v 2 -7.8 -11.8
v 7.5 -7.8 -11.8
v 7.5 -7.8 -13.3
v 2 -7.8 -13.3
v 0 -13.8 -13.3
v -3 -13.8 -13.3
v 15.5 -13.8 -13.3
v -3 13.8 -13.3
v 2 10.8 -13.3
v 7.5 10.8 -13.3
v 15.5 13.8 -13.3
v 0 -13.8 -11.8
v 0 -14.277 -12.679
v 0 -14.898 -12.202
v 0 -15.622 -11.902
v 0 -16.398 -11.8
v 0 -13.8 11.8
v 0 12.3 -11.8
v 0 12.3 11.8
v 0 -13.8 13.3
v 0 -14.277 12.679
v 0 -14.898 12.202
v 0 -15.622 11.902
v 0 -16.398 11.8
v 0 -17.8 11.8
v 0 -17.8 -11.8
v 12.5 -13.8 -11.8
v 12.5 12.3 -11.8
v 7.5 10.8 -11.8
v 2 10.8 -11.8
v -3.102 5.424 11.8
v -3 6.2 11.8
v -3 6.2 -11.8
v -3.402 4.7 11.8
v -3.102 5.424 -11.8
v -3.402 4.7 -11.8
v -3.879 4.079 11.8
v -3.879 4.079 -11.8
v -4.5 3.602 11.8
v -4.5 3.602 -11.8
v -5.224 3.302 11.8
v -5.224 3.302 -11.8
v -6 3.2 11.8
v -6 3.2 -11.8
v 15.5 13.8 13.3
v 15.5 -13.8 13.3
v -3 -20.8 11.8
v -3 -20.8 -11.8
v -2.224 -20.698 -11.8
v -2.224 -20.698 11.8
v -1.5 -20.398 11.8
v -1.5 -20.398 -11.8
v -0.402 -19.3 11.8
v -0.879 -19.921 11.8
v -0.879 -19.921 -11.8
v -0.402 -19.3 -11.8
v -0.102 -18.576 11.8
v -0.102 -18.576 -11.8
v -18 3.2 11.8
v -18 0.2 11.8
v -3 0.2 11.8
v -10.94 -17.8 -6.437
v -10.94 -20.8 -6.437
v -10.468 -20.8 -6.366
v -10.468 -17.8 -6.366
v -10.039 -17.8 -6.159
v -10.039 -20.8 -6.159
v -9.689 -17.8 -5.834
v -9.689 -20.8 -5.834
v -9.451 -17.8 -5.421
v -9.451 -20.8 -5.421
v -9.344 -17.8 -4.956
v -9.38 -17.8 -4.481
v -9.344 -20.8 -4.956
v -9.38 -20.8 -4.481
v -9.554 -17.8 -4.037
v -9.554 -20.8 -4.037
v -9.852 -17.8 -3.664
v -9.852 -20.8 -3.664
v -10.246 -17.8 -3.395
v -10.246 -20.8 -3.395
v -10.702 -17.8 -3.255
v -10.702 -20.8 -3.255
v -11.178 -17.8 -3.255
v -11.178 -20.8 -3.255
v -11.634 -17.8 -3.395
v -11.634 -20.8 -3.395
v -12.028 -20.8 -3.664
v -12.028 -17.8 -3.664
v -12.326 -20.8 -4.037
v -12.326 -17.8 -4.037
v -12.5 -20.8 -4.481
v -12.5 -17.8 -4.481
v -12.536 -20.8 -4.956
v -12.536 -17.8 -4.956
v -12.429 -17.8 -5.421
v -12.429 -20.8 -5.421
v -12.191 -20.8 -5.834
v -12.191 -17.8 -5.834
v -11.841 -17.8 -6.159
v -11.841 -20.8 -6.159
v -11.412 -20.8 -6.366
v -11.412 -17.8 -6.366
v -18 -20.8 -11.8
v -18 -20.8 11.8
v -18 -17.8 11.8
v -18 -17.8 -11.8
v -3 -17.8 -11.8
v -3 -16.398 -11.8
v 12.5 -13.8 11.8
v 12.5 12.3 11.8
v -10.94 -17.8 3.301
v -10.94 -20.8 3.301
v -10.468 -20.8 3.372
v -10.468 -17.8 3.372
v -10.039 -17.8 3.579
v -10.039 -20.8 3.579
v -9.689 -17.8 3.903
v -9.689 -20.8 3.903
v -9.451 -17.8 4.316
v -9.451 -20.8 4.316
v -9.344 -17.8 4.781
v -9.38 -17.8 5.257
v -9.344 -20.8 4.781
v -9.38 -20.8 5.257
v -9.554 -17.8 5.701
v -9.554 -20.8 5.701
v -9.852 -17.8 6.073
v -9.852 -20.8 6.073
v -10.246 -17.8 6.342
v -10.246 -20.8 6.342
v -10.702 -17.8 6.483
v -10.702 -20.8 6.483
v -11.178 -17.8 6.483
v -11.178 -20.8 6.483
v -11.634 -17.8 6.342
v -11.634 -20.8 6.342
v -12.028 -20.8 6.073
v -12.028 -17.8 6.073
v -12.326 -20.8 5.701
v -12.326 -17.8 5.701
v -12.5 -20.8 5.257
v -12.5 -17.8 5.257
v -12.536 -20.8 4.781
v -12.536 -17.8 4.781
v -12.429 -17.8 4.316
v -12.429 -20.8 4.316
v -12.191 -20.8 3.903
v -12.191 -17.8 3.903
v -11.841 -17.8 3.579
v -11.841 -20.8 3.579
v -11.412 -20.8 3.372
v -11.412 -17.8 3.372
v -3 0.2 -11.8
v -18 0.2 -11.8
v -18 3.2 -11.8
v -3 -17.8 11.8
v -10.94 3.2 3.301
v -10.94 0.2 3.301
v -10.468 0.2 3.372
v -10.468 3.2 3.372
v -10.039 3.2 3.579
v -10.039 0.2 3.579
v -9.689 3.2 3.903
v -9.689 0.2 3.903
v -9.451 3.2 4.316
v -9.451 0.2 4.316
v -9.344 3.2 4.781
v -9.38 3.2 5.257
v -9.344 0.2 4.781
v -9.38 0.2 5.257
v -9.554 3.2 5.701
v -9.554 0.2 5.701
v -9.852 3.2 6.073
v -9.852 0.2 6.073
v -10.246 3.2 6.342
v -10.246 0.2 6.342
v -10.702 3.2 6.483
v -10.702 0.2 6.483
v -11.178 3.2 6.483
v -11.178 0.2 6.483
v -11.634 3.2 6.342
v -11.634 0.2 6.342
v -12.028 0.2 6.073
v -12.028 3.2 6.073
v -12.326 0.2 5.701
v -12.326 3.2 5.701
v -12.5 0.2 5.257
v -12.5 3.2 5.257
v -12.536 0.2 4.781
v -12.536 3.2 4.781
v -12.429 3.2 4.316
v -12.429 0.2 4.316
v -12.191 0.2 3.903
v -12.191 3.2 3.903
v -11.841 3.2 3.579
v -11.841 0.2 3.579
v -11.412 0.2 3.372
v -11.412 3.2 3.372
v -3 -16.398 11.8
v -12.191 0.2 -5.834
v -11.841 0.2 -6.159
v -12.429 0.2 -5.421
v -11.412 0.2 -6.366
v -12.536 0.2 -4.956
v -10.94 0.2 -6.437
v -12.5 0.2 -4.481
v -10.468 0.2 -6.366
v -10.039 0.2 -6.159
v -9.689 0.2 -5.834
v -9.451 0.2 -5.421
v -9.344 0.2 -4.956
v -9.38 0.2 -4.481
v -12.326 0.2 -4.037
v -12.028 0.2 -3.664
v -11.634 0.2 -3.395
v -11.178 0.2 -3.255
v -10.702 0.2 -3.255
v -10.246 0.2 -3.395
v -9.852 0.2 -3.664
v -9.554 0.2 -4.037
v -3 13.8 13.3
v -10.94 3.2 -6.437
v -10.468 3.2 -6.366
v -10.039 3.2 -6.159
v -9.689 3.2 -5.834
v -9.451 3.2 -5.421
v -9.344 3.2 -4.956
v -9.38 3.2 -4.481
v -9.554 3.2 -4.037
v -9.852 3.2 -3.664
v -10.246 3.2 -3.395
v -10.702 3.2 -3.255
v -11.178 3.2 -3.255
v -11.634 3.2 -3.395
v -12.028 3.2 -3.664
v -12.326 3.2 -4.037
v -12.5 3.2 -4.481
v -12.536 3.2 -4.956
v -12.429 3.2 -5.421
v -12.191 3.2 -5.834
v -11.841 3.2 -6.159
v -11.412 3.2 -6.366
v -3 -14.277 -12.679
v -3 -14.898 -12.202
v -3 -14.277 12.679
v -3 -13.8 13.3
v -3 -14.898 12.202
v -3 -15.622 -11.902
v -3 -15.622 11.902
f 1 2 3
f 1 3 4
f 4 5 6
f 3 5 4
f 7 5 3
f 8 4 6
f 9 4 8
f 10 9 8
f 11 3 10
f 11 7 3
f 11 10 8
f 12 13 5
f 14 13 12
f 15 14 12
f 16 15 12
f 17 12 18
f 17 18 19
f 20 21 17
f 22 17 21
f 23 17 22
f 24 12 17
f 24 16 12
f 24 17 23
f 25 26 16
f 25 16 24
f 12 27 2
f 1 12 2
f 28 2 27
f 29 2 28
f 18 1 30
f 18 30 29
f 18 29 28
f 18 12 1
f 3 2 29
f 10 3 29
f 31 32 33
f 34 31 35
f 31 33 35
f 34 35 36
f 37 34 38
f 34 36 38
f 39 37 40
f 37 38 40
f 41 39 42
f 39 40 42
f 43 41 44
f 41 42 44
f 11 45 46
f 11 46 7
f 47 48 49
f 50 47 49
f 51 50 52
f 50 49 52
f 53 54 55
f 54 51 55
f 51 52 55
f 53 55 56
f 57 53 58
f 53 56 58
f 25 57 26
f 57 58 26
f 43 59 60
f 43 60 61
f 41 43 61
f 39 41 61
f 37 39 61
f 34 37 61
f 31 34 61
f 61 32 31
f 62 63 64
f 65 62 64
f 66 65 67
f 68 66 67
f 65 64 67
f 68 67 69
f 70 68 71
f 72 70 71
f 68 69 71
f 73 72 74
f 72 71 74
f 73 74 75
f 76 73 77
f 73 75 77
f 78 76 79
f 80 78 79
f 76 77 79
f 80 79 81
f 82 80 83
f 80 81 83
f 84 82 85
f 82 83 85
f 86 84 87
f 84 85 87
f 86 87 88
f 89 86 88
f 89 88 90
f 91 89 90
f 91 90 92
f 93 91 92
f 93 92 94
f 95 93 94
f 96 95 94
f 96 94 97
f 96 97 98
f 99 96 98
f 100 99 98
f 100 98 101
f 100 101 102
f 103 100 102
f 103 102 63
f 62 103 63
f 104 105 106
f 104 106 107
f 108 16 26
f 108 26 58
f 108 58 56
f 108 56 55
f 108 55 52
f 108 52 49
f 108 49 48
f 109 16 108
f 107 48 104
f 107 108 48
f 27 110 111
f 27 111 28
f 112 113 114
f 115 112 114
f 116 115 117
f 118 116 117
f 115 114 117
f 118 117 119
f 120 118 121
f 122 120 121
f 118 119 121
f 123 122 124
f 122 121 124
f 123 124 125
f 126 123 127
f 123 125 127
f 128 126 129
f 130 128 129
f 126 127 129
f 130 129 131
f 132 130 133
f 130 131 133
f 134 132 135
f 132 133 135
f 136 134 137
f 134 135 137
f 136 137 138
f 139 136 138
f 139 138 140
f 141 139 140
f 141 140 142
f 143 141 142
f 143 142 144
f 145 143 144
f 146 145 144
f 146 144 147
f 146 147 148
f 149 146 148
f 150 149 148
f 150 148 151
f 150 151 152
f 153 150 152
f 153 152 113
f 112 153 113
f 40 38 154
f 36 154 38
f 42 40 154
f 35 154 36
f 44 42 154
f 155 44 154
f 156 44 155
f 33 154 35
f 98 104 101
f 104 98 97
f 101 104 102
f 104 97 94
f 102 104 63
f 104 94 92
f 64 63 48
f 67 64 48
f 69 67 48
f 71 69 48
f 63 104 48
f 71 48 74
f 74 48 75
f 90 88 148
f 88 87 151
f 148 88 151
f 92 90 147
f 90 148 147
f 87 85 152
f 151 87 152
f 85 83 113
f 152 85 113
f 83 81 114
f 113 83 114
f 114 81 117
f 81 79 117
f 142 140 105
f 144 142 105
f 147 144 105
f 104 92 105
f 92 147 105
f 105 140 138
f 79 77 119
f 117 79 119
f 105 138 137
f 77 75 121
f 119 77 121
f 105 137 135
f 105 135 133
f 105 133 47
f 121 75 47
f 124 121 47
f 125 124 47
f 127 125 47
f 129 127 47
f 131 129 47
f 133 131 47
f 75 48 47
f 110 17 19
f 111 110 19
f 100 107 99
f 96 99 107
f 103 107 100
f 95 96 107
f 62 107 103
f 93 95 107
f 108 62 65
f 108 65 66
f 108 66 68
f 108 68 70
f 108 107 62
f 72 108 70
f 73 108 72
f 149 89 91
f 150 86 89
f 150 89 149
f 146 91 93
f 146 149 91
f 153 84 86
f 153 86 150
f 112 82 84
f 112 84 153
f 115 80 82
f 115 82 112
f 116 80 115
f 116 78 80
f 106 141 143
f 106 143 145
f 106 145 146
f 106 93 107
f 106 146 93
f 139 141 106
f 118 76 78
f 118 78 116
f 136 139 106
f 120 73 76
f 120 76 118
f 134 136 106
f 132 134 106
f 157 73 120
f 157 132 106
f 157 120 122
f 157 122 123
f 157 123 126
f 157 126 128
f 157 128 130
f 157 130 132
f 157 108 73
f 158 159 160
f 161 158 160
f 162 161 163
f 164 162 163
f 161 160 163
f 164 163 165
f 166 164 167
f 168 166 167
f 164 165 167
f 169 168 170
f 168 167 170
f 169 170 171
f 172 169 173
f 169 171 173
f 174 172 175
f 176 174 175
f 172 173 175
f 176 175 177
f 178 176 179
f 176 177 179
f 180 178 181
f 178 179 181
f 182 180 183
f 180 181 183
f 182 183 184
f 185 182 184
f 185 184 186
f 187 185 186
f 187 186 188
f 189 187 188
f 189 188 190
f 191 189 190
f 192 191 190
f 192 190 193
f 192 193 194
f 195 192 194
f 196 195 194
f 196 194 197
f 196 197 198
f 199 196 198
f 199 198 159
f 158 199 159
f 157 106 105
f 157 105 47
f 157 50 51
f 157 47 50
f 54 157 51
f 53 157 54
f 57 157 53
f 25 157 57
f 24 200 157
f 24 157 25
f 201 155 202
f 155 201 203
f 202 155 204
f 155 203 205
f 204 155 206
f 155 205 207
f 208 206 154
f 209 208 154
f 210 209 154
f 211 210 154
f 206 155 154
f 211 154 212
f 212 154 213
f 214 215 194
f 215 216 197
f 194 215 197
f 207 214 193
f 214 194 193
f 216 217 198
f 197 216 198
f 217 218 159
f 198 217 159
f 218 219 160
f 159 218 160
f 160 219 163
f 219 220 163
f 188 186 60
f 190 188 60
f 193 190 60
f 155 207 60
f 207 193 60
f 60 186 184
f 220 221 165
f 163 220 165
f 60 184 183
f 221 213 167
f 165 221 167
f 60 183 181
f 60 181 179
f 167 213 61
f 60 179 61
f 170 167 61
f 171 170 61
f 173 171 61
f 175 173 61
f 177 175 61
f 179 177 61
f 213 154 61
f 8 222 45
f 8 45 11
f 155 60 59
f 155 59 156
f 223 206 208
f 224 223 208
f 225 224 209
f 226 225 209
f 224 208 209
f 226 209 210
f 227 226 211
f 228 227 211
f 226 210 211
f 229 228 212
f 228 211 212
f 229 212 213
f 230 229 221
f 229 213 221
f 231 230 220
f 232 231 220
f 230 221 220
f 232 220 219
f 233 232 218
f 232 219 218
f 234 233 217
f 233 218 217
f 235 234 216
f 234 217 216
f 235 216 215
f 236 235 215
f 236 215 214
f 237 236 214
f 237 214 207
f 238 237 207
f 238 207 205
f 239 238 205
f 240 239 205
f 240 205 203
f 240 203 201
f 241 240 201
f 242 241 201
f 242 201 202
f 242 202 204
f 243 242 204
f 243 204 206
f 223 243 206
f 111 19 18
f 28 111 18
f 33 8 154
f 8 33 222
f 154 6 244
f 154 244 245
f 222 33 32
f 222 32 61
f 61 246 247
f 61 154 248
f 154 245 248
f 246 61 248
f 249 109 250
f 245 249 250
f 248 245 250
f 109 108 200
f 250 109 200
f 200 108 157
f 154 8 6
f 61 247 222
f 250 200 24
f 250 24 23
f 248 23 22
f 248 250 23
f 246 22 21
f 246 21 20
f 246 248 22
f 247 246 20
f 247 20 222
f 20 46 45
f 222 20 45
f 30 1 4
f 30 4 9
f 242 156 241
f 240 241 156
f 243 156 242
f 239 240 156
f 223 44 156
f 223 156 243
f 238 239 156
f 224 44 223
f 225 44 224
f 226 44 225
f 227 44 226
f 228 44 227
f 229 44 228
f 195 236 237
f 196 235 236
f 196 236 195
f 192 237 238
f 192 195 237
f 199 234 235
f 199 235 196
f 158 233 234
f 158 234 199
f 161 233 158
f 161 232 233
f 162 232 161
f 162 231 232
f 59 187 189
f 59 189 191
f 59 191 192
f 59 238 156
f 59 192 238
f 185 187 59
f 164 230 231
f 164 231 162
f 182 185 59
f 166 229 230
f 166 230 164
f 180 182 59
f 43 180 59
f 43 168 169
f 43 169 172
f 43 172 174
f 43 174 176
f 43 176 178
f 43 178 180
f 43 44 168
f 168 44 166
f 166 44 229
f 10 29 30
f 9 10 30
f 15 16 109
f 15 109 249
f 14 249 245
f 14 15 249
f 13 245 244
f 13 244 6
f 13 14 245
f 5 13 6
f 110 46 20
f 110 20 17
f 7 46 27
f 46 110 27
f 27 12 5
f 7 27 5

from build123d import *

# Parameters (mm, degrees)
SKETCH1_W                = 26.6
SKETCH1_H                = 27.6
SKETCH1_W_2              = 23.6
SKETCH1_H_2              = 24.6
BOSS_EXTRUDE1_DEPTH      = 12.5
SKETCH2_W                = 26.6
SKETCH2_H                = 27.6
BOSS_EXTRUDE2_DEPTH      = 3
SKETCH4_W                = 26.6
SKETCH4_H                = 27.6
BOSS_EXTRUDE3_DEPTH      = 3
SKETCH6_W                = 12.5
SKETCH6_H                = 20.6
CUT_EXTRUDE1_DEPTH       = 3
BOSS_EXTRUDE4_DEPTH      = 7
BOSS_EXTRUDE4_DEPTH_BACK = 17
SKETCH7_W                = 12.54
SKETCH7_H                = 14.392021094
SKETCH8_R                = 1.6
CUT_EXTRUDE2_DEPTH       = 41.17835238
SKETCH10_W               = 9.54
SKETCH10_H               = 18
CUT_EXTRUDE3_DEPTH       = 34.198989028
SKETCH14_W               = 12.5
SKETCH14_H               = 23.6
CUT_EXTRUDE5_DEPTH       = 3
SKETCH24_W               = 3
SKETCH24_H               = 5.880857343
BOSS_EXTRUDE7_DEPTH      = 7
SKETCH25_W               = 3
SKETCH25_H               = 6.327121563
BOSS_EXTRUDE8_DEPTH      = 7
SKETCH27_W               = 26.6
SKETCH27_H               = 3
BOSS_EXTRUDE9_DEPTH      = 20
SKETCH32_W               = 26.6
SKETCH32_H               = 3
BOSS_EXTRUDE10_DEPTH     = 20
FILLET1_R                = 3
SKETCH35_W               = 20
SKETCH35_H               = 24
CUT_EXTRUDE9_DEPTH       = 1.5
SKETCH36_W               = 3
SKETCH36_H               = 7
CUT_EXTRUDE10_DEPTH      = 1.5
SKETCH37_W               = 20
SKETCH37_H               = 24
CUT_EXTRUDE11_DEPTH      = 1.5
SKETCH38_W               = 3
SKETCH38_H               = 7
CUT_EXTRUDE12_DEPTH      = 1.5
FILLET3_R                = 3
FILLET4_R                = 3
FILLET5_R                = 3
SKETCH39_W               = 5
SKETCH39_H               = 23.6
CUT_EXTRUDE13_DEPTH      = 24
SKETCH41_R               = 1.6
CUT_EXTRUDE14_DEPTH      = 24
SKETCH42_W               = 5.5
SKETCH42_H               = 18.6
CUT_EXTRUDE15_DEPTH      = 38.237749663


with BuildPart() as part:
    # Sketch1 → Boss-Extrude1 (new body)
    with BuildSketch(Plane(origin=(0, 0, 0), x_dir=(0, 0, -1), z_dir=(1, 0, 0))):
        Rectangle(SKETCH1_W, SKETCH1_H)
        Rectangle(SKETCH1_W_2, SKETCH1_H_2, mode=Mode.SUBTRACT)
    extrude(amount=BOSS_EXTRUDE1_DEPTH)

    # Sketch2 → Boss-Extrude2 (add)
    with BuildSketch(Plane.ZY):
        Rectangle(SKETCH2_W, SKETCH2_H)
    extrude(amount=BOSS_EXTRUDE2_DEPTH)

    # Sketch4 → Boss-Extrude3 (add)
    with BuildSketch(Plane(origin=(12.5, 0, 0), x_dir=(0, 0, -1), z_dir=(1, 0, 0))):
        Rectangle(SKETCH4_W, SKETCH4_H)
    extrude(amount=BOSS_EXTRUDE3_DEPTH)

    # Sketch6 → Cut-Extrude1 (cut)
    with BuildSketch(Plane(origin=(0, -13.8, 0), x_dir=(-1, 0, 0), z_dir=(0, -1, 0))):
        with Locations((-6.25, 0)):
            Rectangle(SKETCH6_W, SKETCH6_H)
    extrude(amount=-CUT_EXTRUDE1_DEPTH, mode=Mode.SUBTRACT)

    # Sketch7 → Boss-Extrude4 (add, two sides: drawn at the far end of the back side and taken through both)
    with BuildSketch(Plane(origin=(0, -13.8, 0), x_dir=(-1, 0, 0), z_dir=(0, -1, 0)).offset(-BOSS_EXTRUDE4_DEPTH_BACK)):
        with Locations((6.27, -0.22313211)):
            Rectangle(SKETCH7_W, SKETCH7_H)
    extrude(amount=BOSS_EXTRUDE4_DEPTH + BOSS_EXTRUDE4_DEPTH_BACK)

    # Sketch8 → Cut-Extrude2 (cut, through all)
    with BuildSketch(Plane(origin=(0, -20.8, 0), x_dir=(-1, 0, 0), z_dir=(0, -1, 0))):
        with Locations(Location((9.94, -4.900507757, 0), (0, 0, 90))):
            Circle(SKETCH8_R)
        with Locations(Location((9.94, 4.836704631, 0), (0, 0, 90))):
            Circle(SKETCH8_R)
    extrude(amount=-CUT_EXTRUDE2_DEPTH, mode=Mode.SUBTRACT)

    # Sketch10 → Cut-Extrude3 (cut, through all)
    with BuildSketch(Plane.XY.offset(7.419142657)):
        with Locations((-7.77, -8.8)):
            Rectangle(SKETCH10_W, SKETCH10_H)
    extrude(amount=-CUT_EXTRUDE3_DEPTH, mode=Mode.SUBTRACT)

    # Sketch14 → Cut-Extrude5 (cut)
    with BuildSketch(Plane(origin=(0, -13.8, 0), x_dir=(-1, 0, 0), z_dir=(0, -1, 0))):
        with Locations((-6.25, 0)):
            Rectangle(SKETCH14_W, SKETCH14_H)
    extrude(amount=-CUT_EXTRUDE5_DEPTH, mode=Mode.SUBTRACT)

    # Sketch24 → Boss-Extrude7 (add)
    with BuildSketch(Plane(origin=(0, -13.8, 0), x_dir=(-1, 0, 0), z_dir=(0, -1, 0))):
        with Locations((1.5, -10.359571328)):
            Rectangle(SKETCH24_W, SKETCH24_H)
    extrude(amount=BOSS_EXTRUDE7_DEPTH)

    # Sketch25 → Boss-Extrude8 (add)
    with BuildSketch(Plane(origin=(0, -13.8, 0), x_dir=(-1, 0, 0), z_dir=(0, -1, 0))):
        with Locations((1.5, 10.136439219)):
            Rectangle(SKETCH25_W, SKETCH25_H)
    extrude(amount=BOSS_EXTRUDE8_DEPTH)

    # Sketch27 → Boss-Extrude9 (add)
    with BuildSketch(Plane.ZY.offset(3)):
        with Locations((0, -19.3)):
            Rectangle(SKETCH27_W, SKETCH27_H)
    extrude(amount=BOSS_EXTRUDE9_DEPTH)

    # Sketch32 → Boss-Extrude10 (add)
    with BuildSketch(Plane.ZY.offset(3)):
        with Locations((0, 1.7)):
            Rectangle(SKETCH32_W, SKETCH32_H)
    extrude(amount=BOSS_EXTRUDE10_DEPTH)

    # Fillet1
    fillet1_edges = [part.edges().sort_by_distance(p)[0] for p in [
        (0, -20.8, 0),
    ]]
    fillet(fillet1_edges, radius=FILLET1_R)

    # Sketch35 → Cut-Extrude9 (cut)
    with BuildSketch(Plane.XY.offset(13.3)):
        with Locations((-13, -8.8)):
            Rectangle(SKETCH35_W, SKETCH35_H)
    extrude(amount=-CUT_EXTRUDE9_DEPTH, mode=Mode.SUBTRACT)

    # Sketch36 → Cut-Extrude10 (cut)
    with BuildSketch(Plane.XY.offset(13.3)):
        with Locations((-1.5, -17.3)):
            Rectangle(SKETCH36_W, SKETCH36_H)
    extrude(amount=-CUT_EXTRUDE10_DEPTH, mode=Mode.SUBTRACT)

    # Sketch37 → Cut-Extrude11 (cut)
    with BuildSketch(Plane(origin=(0, 0, -13.3), x_dir=(-1, 0, 0), z_dir=(0, 0, -1))):
        with Locations((13, -8.8)):
            Rectangle(SKETCH37_W, SKETCH37_H)
    extrude(amount=-CUT_EXTRUDE11_DEPTH, mode=Mode.SUBTRACT)

    # Sketch38 → Cut-Extrude12 (cut)
    with BuildSketch(Plane(origin=(0, 0, -13.3), x_dir=(-1, 0, 0), z_dir=(0, 0, -1))):
        with Locations((1.5, -17.3)):
            Rectangle(SKETCH38_W, SKETCH38_H)
    extrude(amount=-CUT_EXTRUDE12_DEPTH, mode=Mode.SUBTRACT)

    # Fillet3
    # the kernel refuses this fillet: 3 mm, written as the material it adds along each edge
    with BuildSketch(Plane(origin=(-3, -13.8, 11.8), x_dir=(0, 0, 1), z_dir=(1, 0, 0))) as fillet3_piece_1:
        with BuildLine():
            CenterArc((3, 2.598076211), FILLET3_R, 180, 60)
            Line((0, 2.598076211), (0, 0))
            Line((0, 0), (1.5, 0))
        make_face()
    extrude(amount=3)

    # Fillet4
    # the kernel refuses this fillet: 3 mm, written as the material it adds along each edge
    with BuildSketch(Plane(origin=(0, -13.8, -11.8), x_dir=(0, 0, -1), z_dir=(-1, 0, 0))) as fillet4_piece_1:
        with BuildLine():
            CenterArc((3, 2.598076211), FILLET4_R, 180, 60)
            Line((0, 2.598076211), (0, 0))
            Line((0, 0), (1.5, 0))
        make_face()
    extrude(amount=3)

    # Fillet5
    fillet5_edges = [part.edges().sort_by_distance(p)[0] for p in [
        (-3, 3.2, 0),
    ]]
    fillet(fillet5_edges, radius=FILLET5_R)

    # Sketch39 → Cut-Extrude13 (cut)
    with BuildSketch(Plane(origin=(0, -20.8, 0), x_dir=(-1, 0, 0), z_dir=(0, -1, 0))):
        with Locations((20.5, 0)):
            Rectangle(SKETCH39_W, SKETCH39_H)
    extrude(amount=-CUT_EXTRUDE13_DEPTH, mode=Mode.SUBTRACT)

    # Sketch41 → Cut-Extrude14 (cut)
    with BuildSketch(Plane(origin=(0, -20.8, 0), x_dir=(-1, 0, 0), z_dir=(0, -1, 0))):
        with Locations(Location((10.94, -4.900507757, 0), (0, 0, 90))):
            Circle(SKETCH41_R)
        with Locations(Location((10.94, 4.836704631, 0), (0, 0, 90))):
            Circle(SKETCH41_R)
    extrude(amount=-CUT_EXTRUDE14_DEPTH, mode=Mode.SUBTRACT)

    # Sketch42 → Cut-Extrude15 (cut, through all)
    with BuildSketch(Plane(origin=(0, 0, 11.8), x_dir=(-1, 0, 0), z_dir=(0, 0, -1))):
        with Locations((-4.75, 1.5)):
            Rectangle(SKETCH42_W, SKETCH42_H)
    extrude(amount=CUT_EXTRUDE15_DEPTH, mode=Mode.SUBTRACT)


solid = part.part
